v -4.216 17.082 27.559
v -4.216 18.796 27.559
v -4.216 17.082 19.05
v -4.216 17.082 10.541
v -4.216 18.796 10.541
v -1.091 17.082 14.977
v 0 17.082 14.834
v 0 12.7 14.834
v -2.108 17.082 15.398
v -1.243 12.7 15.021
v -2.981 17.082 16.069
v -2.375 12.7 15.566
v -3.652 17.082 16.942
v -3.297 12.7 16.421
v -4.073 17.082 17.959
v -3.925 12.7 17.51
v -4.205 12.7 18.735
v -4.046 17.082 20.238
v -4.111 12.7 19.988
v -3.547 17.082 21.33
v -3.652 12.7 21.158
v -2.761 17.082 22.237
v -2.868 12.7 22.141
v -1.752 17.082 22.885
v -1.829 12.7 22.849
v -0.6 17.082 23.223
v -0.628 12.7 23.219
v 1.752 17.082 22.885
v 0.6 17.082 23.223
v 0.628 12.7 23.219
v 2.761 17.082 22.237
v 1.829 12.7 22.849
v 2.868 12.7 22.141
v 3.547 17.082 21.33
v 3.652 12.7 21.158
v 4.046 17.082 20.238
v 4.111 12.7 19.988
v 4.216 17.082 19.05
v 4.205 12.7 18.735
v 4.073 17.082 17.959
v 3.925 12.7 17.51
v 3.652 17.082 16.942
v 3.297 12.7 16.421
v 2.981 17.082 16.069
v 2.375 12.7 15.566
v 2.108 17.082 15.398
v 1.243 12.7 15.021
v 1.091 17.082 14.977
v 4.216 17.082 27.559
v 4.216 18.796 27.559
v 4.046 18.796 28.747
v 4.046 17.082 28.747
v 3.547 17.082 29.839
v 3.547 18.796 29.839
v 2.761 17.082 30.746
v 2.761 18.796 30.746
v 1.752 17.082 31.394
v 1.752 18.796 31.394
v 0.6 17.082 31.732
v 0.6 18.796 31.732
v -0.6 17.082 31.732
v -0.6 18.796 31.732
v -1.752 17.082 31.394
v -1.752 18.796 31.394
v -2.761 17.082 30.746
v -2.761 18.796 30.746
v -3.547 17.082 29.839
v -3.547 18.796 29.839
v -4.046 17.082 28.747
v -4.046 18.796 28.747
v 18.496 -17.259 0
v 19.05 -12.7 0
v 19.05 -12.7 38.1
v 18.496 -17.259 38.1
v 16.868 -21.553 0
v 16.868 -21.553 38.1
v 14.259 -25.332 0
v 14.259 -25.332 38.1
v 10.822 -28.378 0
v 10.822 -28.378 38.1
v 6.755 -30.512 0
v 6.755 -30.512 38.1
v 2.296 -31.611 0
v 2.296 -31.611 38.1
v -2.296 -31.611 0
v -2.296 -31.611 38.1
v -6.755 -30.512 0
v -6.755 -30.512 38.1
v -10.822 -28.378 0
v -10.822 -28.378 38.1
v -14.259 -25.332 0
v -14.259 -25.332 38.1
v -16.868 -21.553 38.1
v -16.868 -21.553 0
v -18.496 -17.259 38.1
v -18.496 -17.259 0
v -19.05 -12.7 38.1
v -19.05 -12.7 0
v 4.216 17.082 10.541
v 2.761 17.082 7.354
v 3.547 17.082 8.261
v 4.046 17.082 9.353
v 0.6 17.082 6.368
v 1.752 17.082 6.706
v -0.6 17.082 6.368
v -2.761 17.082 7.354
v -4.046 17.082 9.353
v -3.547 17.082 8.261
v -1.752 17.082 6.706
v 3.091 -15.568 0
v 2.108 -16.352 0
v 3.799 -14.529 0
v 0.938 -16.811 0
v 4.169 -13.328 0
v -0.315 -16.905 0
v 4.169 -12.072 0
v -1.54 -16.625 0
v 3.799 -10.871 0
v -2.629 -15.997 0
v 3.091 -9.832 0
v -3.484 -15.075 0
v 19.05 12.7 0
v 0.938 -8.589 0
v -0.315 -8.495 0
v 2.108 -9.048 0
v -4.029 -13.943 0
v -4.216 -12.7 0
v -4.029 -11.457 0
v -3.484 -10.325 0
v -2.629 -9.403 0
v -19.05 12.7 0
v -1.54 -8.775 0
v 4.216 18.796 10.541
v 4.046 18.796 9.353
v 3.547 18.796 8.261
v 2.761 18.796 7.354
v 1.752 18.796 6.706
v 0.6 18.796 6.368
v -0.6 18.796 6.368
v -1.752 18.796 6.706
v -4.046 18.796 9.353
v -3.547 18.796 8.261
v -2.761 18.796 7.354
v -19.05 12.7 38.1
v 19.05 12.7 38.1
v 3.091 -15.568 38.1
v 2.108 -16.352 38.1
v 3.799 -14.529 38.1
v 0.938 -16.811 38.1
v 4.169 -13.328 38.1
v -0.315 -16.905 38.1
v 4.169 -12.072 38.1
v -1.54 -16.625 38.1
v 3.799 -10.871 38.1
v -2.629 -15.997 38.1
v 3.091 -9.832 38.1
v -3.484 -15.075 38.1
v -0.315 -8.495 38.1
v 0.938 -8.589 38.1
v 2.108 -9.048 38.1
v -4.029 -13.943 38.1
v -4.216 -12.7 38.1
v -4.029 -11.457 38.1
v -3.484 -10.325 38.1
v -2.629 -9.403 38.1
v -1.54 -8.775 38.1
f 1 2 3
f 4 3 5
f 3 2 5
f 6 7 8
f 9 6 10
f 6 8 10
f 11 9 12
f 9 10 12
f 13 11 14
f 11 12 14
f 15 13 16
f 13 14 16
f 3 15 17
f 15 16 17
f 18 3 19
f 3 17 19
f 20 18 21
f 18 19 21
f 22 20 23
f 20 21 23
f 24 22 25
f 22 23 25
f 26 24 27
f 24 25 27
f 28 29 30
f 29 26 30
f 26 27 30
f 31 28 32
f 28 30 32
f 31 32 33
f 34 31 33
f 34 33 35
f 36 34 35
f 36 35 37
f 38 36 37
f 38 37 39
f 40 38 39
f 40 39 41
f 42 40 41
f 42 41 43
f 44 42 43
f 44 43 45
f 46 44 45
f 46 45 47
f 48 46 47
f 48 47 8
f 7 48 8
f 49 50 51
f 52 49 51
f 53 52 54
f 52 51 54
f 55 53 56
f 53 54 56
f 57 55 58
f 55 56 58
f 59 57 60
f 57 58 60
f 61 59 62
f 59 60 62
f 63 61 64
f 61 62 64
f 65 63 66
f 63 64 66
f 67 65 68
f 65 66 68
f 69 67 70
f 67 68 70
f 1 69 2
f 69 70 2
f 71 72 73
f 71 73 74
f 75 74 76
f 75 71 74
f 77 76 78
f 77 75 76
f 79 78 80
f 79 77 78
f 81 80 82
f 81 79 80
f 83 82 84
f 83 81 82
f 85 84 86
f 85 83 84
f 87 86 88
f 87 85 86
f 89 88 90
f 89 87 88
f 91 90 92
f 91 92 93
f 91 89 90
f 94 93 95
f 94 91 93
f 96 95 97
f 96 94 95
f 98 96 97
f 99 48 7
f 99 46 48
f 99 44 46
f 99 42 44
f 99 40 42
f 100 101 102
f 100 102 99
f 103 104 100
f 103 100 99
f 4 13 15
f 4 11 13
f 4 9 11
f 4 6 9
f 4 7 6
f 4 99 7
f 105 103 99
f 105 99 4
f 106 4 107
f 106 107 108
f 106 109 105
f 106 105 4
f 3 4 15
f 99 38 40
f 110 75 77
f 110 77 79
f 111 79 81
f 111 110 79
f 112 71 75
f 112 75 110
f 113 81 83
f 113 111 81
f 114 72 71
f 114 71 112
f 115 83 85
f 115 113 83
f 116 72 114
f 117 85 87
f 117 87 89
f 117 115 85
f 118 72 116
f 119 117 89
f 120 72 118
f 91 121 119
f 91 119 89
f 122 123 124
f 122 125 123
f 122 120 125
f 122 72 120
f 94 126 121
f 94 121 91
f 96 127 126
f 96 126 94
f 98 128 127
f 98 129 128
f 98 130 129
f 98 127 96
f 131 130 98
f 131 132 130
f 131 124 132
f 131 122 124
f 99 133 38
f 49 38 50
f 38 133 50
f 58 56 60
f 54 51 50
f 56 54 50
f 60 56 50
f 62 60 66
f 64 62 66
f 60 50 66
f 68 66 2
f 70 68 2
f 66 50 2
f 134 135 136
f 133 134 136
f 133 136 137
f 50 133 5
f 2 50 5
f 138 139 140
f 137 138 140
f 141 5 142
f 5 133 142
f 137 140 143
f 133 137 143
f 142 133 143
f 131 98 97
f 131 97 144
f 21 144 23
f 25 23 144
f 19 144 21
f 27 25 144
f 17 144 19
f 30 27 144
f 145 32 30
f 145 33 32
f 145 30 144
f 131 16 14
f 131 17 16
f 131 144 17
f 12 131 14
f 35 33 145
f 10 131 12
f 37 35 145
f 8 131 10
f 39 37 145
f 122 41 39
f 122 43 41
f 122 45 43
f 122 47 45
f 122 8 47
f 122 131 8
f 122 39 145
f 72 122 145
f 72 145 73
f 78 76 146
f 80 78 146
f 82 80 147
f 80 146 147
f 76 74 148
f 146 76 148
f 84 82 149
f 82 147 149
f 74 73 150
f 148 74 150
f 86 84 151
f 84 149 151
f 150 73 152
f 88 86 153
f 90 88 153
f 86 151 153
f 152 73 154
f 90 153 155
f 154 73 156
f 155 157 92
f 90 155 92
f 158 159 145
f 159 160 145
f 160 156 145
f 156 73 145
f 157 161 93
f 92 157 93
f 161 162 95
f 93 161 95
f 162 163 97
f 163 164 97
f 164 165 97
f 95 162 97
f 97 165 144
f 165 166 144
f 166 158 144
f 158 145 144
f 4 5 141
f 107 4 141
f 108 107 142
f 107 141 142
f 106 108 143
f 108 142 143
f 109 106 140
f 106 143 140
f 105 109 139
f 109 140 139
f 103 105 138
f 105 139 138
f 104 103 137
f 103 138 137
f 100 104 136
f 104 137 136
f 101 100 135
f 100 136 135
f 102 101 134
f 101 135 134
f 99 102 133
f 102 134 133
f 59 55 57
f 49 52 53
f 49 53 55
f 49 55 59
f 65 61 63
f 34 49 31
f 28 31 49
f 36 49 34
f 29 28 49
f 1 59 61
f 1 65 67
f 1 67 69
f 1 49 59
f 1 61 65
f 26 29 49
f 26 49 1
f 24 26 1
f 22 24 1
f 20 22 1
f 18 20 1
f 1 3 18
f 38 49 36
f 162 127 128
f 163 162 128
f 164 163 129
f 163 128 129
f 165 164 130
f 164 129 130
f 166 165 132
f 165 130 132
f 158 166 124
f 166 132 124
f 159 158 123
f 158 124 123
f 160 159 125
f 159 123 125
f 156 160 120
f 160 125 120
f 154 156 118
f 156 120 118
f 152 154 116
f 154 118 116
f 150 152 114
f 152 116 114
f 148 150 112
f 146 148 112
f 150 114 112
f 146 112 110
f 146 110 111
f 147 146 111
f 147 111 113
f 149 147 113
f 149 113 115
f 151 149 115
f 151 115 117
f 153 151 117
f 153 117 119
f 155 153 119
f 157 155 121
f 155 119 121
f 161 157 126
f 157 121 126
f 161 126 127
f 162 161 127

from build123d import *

# Parameters (mm, degrees)
BOSS_EXTRUDE1_DEPTH = 38.1
SKETCH2_R           = 4.2164
CUT_EXTRUDE1_DEPTH  = 38.1
SKETCH3_R           = 4.2164
BOSS_EXTRUDE2_DEPTH = 6.096
BOSS_EXTRUDE3_DEPTH = 1.7145


with BuildPart() as part:
    # Sketch1 → Boss-Extrude1 (new body)
    with BuildSketch(Plane.XY):
        with BuildLine():
            Line((-19.05, -12.7), (-19.05, 12.7))
            Line((-19.05, 12.7), (19.05, 12.7))
            Line((19.05, 12.7), (19.05, -12.7))
            ThreePointArc((19.05, -12.7), (0, -31.75), (-19.05, -12.7))
        make_face()
    extrude(amount=BOSS_EXTRUDE1_DEPTH)

    # Sketch2 → Cut-Extrude1 (cut)
    with BuildSketch(Plane(origin=(0, 0, 0), x_dir=(-1, 0, 0), z_dir=(0, 0, -1))):
        with Locations((0, -12.7)):
            Circle(SKETCH2_R)
    extrude(amount=-CUT_EXTRUDE1_DEPTH, mode=Mode.SUBTRACT)

    # Sketch3 → Boss-Extrude2 (add)
    with BuildSketch(Plane(origin=(0, 12.7, 0), x_dir=(1, 0, 0), z_dir=(0, 1, 0))):
        with Locations(Location((0, -19.05, 0), (0, 0, 90))):
            Circle(SKETCH3_R)
    extrude(amount=BOSS_EXTRUDE2_DEPTH)

    # Sketch4 → Boss-Extrude3 (add)
    with BuildSketch(Plane(origin=(0, 18.796, 0), x_dir=(1, 0, 0), z_dir=(0, 1, 0))):
        with BuildLine():
            Line((-4.2164, -27.559), (-4.2164, -10.541))
            ThreePointArc((-4.2164, -10.541), (0, -6.3246), (4.2164, -10.541))
            Line((4.2164, -10.541), (4.2164, -27.559))
            ThreePointArc((4.2164, -27.559), (0, -31.7754), (-4.2164, -27.559))
        make_face()
    extrude(amount=-BOSS_EXTRUDE3_DEPTH)


solid = part.part
